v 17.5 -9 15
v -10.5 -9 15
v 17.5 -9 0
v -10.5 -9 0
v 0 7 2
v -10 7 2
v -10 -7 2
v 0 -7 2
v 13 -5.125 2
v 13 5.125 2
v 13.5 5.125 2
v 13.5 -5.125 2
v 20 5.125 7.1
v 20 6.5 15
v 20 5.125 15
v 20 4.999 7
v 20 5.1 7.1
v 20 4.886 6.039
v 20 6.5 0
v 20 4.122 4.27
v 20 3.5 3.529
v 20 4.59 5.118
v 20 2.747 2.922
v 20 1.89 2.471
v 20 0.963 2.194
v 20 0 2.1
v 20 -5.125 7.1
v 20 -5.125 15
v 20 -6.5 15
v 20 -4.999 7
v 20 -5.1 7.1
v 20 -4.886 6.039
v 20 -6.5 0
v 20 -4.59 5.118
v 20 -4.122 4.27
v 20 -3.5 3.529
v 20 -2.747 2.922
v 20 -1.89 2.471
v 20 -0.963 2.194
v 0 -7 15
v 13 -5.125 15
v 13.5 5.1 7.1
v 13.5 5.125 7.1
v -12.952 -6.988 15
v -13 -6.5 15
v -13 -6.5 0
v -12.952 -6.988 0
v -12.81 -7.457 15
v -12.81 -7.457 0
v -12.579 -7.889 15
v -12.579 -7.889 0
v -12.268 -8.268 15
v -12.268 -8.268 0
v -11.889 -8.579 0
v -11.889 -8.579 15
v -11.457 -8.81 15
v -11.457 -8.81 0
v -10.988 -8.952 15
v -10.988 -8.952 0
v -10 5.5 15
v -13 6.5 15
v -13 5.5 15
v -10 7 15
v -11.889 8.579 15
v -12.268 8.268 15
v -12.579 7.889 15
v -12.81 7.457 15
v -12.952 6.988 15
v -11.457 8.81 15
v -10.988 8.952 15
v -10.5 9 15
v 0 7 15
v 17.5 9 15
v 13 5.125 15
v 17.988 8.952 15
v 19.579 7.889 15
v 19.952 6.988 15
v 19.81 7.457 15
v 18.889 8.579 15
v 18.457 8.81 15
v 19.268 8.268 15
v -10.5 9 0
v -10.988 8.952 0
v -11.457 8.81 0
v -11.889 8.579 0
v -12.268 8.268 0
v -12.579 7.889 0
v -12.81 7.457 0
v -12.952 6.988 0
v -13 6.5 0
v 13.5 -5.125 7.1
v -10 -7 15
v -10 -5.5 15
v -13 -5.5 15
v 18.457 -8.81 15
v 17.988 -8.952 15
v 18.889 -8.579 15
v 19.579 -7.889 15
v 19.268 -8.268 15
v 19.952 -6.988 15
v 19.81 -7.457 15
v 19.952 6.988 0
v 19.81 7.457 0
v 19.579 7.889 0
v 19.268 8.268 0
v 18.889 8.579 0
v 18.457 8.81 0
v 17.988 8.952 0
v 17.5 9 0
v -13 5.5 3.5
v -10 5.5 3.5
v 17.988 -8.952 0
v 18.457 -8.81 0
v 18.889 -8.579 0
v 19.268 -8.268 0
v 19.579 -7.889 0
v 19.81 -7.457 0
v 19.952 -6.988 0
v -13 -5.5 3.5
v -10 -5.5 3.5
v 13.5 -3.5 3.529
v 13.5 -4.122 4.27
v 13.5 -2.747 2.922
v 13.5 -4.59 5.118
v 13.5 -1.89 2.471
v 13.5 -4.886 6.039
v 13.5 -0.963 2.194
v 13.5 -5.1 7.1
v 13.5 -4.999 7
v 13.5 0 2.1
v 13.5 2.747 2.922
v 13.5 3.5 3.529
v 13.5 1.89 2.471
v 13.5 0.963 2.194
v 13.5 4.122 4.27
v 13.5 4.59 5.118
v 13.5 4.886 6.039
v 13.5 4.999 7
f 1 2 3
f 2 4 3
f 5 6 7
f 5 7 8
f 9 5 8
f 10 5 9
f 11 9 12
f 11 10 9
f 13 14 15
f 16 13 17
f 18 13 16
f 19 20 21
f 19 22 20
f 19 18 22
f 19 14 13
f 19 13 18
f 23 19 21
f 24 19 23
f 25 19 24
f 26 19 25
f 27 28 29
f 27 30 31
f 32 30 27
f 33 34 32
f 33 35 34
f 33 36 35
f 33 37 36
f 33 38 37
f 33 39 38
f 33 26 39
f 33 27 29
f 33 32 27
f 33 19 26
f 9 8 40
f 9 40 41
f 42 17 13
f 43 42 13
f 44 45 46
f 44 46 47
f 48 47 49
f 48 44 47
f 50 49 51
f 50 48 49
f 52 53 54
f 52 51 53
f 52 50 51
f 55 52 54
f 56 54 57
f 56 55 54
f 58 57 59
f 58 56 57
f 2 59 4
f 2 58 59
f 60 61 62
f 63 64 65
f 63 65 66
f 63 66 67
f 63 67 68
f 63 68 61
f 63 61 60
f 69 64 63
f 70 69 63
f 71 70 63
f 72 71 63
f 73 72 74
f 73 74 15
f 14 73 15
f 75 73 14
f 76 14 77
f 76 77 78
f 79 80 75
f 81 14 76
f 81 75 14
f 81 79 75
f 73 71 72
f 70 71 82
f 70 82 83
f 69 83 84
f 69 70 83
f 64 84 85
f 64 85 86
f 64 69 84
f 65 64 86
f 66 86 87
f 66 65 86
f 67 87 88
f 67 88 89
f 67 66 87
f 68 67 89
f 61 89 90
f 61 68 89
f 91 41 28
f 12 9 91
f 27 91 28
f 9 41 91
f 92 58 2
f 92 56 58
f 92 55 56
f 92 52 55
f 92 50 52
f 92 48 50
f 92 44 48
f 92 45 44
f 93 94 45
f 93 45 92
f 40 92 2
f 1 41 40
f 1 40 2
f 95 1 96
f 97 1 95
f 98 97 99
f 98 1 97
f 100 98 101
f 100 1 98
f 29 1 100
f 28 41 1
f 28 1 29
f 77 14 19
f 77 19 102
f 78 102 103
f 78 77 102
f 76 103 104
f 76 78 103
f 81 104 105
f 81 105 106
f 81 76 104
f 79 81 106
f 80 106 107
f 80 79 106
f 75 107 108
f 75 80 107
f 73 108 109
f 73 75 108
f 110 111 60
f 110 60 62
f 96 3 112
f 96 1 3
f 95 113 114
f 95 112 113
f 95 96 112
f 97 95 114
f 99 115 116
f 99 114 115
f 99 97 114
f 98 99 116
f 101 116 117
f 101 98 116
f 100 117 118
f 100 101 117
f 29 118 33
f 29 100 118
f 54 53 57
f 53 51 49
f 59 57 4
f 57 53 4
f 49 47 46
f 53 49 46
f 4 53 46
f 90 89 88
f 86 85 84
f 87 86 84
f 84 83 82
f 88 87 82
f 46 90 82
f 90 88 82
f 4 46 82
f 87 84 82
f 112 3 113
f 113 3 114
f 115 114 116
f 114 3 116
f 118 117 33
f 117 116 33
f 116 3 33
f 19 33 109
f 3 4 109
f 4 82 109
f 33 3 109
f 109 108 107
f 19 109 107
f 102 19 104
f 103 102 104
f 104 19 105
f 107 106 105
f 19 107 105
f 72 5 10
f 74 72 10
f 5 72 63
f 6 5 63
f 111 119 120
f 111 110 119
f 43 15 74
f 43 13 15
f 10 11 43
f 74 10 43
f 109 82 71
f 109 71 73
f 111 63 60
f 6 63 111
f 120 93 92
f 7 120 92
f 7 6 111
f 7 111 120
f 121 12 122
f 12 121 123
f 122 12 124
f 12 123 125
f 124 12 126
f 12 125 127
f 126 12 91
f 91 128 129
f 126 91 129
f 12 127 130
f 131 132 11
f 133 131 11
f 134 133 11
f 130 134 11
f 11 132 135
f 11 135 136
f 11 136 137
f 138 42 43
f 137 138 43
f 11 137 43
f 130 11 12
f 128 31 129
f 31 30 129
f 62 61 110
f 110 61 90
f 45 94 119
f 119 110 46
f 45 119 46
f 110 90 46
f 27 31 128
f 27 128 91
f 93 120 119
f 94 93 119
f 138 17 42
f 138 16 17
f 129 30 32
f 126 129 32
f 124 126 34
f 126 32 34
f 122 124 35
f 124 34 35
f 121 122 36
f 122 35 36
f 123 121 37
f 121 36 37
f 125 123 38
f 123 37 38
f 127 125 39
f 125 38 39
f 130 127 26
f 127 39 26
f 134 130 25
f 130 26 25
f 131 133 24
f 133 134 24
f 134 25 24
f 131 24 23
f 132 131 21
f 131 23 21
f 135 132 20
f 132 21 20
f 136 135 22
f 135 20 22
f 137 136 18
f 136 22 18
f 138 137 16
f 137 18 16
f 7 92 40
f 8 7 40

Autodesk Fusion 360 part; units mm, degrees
sketch "Sketch1" plane through (0, 0, 0) normal (0, 0, 1) x (1, 0, 0)
  line L0 (0, 0) -> (0, 7)
  line L1 (0, 0) -> (0, -7)
  line L2 (0, 0) -> (20, 0)
  line L3 (20, 0) -> (20, -5.125)
  line L4 (20, 0) -> (20, 5.125)
  line L5 (0, 0) -> (13, 0)
  line L6 (20, 5.125) -> (13, 5.125)
  line L7 (13, 5.125) -> (13, -5.125)
  line L8 (13, -5.125) -> (20, -5.125)
  line L9 (20, -5.125) -> (20, 5.125)
  line L10 (0, 7) -> (13, 5.125)
  line L11 (0, -7) -> (13, -5.125)
  line L12 (0, 7) -> (-10, 7)
  line L13 (-10, 7) -> (-10, -7)
  line L14 (-10, -7) -> (0, -7)
  line L15 (0, -7) -> (0, 7)
  line L16 (-10, 0) -> (-10, 5.5)
  line L17 (-10, 0) -> (-10, -5.5)
  line L18 (20, -9) -> (0, -9)
  line L19 (0, -9) -> (0, 9)
  line L20 (0, 9) -> (20, 9)
  line L21 (20, 9) -> (20, -9)
  line L22 (20, -9) -> (0, 9) construction
  line L23 (0, -9) -> (20, 9) construction
  line L24 (-13, -9) -> (13, -9)
  line L25 (13, -9) -> (13, 9)
  line L26 (13, 9) -> (-13, 9)
  line L27 (-13, 9) -> (-13, -9)
  line L28 (-13, -9) -> (13, 9) construction
  line L29 (13, -9) -> (-13, 9) construction
  line L30 (-10, 5.5) -> (-13, 5.5)
  line L31 (-10, -5.5) -> (-13, -5.5)
  point P0 (10, 0)
  dimension "d1" = 7
  dimension "d2" = 5.125
  dimension "d3" = 5.125
  dimension "d4" = 13
  dimension "d5" = 5.5
  dimension "d6" = 5.5
extrude "Extrude1" add sketch "Sketch1" along normal blind 15 contours L10 L19 L20 L25 L26 | L12 L13 L19 L26 L27 L30 | L13 L14 L19 L24 L27 L31 | L11 L18 L19 L24 L25 | L6 L20 L21 L25 | L8 L18 L21 L25 makes body 1 at (-2, -9, 5) makes body 2 at (9, 9, 5)
extrude "Extrude2" add sketch "Sketch1" along normal blind 2 contours L0 L1 L12 L13 L14 L15 L16 L17 L19 | L1 L2 L5 L7 L11 L15 L19 L25 | L0 L2 L5 L7 L10 L15 L19 L25 | L2 L4 L6 L7 L9 L21 L25 | L2 L3 L7 L8 L9 L21 L25 bodies 1 2
extrude "Extrude3" add sketch "Sketch1" along normal blind 3.5 contours L13 L16 L17 L27 L30 L31 bodies 1
sketch "Sketch2" plane through (20, 0, 0) normal (1, 0, 0) x (0, 1, 0)
  line L0 (-9, 0) -> (9, 0)
  line L1 (9, 0) -> (9, 15)
  line L2 (9, 15) -> (5.125, 15)
  line L3 (5.125, 15) -> (5.125, 2)
  line L4 (5.125, 2) -> (-5.125, 2)
  line L5 (-5.125, 2) -> (-5.125, 15)
  line L6 (-5.125, 15) -> (-9, 15)
  line L7 (-9, 15) -> (-9, 0)
  line L8 (0, 2) -> (0, 7.1)
  circle A0 centre (0, 7.1) radius 5
  line L9 (-5, 7.1) -> (-5.125, 7.1)
  line L10 (5, 7.1) -> (5.125, 7.1)
  dimension "d13" = 5.1
  dimension "d14" = 10
extrude "Extrude4" add sketch "Sketch2" against normal blind 6.5 contours L4 L5 L8 A0 L9 | L3 L4 L8 A0 L10 bodies 1
chamfer "Chamfer1" distance 0.1 angle 45 2 edges at (16.75, -5, 7.1) (16.75, 5, 7.1) on bodies 1
fillet "Fillet1" radius 2.5 4 edges at (-13, -9, 7.5) (20, -9, 7.5) (-13, 9, 7.5) (20, 9, 7.5) on bodies 1
